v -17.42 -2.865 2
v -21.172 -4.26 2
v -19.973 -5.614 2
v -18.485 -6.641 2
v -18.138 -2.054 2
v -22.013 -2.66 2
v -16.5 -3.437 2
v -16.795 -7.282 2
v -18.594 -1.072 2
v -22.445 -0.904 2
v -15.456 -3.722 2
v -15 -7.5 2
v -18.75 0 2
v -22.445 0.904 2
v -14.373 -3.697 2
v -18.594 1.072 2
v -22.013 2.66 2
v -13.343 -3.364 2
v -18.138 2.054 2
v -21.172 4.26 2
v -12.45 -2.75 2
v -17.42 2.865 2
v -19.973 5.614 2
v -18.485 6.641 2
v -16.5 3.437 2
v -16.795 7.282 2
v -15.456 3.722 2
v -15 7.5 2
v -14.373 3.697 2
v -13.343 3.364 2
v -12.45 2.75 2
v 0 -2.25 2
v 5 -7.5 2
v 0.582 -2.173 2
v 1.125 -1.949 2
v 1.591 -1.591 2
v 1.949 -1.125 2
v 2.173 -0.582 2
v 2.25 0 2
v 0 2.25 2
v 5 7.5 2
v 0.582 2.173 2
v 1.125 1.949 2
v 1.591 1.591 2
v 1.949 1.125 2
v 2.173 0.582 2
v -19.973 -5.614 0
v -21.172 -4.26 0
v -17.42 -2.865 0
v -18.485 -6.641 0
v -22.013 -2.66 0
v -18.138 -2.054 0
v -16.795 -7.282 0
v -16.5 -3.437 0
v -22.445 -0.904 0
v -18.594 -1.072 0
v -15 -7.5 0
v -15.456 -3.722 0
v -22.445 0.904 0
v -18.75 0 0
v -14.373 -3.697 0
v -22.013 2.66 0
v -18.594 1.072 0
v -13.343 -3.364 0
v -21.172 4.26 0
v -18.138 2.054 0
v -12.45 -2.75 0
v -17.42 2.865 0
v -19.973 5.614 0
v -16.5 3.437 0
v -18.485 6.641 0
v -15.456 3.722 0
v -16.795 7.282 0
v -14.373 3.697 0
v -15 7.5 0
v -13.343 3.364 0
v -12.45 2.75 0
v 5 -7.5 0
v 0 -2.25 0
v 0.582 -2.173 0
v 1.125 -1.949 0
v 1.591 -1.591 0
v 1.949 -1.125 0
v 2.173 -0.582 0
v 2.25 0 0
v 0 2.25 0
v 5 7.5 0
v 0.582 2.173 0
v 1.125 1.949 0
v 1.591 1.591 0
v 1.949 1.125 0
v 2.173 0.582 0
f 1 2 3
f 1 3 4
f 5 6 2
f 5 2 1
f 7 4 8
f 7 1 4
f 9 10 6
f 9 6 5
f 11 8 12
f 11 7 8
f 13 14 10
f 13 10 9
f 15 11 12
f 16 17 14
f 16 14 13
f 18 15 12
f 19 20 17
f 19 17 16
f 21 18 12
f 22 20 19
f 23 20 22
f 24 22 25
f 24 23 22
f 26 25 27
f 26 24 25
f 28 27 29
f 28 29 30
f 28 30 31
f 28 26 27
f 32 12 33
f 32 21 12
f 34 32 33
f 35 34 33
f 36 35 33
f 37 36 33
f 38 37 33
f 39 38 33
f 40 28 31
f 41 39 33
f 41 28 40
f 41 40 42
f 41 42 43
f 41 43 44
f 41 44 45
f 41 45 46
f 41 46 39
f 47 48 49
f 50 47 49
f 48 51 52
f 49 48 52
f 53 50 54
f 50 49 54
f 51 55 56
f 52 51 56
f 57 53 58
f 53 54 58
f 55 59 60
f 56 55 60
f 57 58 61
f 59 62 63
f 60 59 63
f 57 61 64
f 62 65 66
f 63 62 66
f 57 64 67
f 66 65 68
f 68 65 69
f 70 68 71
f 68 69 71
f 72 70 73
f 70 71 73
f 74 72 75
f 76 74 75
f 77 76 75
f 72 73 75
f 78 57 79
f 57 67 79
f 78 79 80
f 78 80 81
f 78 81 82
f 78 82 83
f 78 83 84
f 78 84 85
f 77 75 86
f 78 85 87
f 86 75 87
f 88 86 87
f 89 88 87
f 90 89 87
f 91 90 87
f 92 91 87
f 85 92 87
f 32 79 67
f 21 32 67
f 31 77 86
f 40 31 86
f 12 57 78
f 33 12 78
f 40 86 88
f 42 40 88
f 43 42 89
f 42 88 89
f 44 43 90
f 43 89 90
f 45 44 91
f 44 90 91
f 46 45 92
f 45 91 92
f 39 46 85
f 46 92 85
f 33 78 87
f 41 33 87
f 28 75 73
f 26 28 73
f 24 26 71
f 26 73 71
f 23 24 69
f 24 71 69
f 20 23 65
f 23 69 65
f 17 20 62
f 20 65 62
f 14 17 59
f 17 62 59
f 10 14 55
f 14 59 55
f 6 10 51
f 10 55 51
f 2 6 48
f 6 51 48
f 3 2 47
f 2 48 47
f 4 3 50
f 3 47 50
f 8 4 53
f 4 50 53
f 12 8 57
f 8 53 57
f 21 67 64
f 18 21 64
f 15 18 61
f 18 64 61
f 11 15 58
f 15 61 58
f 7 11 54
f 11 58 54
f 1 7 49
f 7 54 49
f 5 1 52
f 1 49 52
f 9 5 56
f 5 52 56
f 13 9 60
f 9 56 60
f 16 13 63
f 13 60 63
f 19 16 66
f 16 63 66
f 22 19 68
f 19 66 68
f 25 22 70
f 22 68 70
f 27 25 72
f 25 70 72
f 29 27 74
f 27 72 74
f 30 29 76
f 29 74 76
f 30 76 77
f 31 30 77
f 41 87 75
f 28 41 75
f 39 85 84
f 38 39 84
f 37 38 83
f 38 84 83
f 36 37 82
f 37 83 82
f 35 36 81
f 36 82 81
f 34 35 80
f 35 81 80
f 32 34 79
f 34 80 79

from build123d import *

# Parameters (mm, degrees)
BOSS_EXTRUDE1_DEPTH = 2


with BuildPart() as part:
    # Sketch1 → Boss-Extrude1 (new body)
    with BuildSketch(Plane.XY):
        with BuildLine():
            Line((5, 7.5), (-15, 7.5))
            ThreePointArc((-15, 7.5), (-22.5, 0), (-15, -7.5))
            Line((-15, -7.5), (5, -7.5))
            Line((5, -7.5), (5, 7.5))
        make_face()
        with BuildLine():
            ThreePointArc((-12.450490243, -2.75), (-18.75, 0), (-12.450490243, 2.75))
            Line((-12.450490243, 2.75), (0, 2.25))
            ThreePointArc((0, 2.25), (1.590990258, 1.590990258), (2.25, 0))
            ThreePointArc((2.25, 0), (1.590990258, -1.590990258), (0, -2.25))
            Line((0, -2.25), (-12.450490243, -2.75))
        make_face(mode=Mode.SUBTRACT)
    extrude(amount=BOSS_EXTRUDE1_DEPTH)


solid = part.part
